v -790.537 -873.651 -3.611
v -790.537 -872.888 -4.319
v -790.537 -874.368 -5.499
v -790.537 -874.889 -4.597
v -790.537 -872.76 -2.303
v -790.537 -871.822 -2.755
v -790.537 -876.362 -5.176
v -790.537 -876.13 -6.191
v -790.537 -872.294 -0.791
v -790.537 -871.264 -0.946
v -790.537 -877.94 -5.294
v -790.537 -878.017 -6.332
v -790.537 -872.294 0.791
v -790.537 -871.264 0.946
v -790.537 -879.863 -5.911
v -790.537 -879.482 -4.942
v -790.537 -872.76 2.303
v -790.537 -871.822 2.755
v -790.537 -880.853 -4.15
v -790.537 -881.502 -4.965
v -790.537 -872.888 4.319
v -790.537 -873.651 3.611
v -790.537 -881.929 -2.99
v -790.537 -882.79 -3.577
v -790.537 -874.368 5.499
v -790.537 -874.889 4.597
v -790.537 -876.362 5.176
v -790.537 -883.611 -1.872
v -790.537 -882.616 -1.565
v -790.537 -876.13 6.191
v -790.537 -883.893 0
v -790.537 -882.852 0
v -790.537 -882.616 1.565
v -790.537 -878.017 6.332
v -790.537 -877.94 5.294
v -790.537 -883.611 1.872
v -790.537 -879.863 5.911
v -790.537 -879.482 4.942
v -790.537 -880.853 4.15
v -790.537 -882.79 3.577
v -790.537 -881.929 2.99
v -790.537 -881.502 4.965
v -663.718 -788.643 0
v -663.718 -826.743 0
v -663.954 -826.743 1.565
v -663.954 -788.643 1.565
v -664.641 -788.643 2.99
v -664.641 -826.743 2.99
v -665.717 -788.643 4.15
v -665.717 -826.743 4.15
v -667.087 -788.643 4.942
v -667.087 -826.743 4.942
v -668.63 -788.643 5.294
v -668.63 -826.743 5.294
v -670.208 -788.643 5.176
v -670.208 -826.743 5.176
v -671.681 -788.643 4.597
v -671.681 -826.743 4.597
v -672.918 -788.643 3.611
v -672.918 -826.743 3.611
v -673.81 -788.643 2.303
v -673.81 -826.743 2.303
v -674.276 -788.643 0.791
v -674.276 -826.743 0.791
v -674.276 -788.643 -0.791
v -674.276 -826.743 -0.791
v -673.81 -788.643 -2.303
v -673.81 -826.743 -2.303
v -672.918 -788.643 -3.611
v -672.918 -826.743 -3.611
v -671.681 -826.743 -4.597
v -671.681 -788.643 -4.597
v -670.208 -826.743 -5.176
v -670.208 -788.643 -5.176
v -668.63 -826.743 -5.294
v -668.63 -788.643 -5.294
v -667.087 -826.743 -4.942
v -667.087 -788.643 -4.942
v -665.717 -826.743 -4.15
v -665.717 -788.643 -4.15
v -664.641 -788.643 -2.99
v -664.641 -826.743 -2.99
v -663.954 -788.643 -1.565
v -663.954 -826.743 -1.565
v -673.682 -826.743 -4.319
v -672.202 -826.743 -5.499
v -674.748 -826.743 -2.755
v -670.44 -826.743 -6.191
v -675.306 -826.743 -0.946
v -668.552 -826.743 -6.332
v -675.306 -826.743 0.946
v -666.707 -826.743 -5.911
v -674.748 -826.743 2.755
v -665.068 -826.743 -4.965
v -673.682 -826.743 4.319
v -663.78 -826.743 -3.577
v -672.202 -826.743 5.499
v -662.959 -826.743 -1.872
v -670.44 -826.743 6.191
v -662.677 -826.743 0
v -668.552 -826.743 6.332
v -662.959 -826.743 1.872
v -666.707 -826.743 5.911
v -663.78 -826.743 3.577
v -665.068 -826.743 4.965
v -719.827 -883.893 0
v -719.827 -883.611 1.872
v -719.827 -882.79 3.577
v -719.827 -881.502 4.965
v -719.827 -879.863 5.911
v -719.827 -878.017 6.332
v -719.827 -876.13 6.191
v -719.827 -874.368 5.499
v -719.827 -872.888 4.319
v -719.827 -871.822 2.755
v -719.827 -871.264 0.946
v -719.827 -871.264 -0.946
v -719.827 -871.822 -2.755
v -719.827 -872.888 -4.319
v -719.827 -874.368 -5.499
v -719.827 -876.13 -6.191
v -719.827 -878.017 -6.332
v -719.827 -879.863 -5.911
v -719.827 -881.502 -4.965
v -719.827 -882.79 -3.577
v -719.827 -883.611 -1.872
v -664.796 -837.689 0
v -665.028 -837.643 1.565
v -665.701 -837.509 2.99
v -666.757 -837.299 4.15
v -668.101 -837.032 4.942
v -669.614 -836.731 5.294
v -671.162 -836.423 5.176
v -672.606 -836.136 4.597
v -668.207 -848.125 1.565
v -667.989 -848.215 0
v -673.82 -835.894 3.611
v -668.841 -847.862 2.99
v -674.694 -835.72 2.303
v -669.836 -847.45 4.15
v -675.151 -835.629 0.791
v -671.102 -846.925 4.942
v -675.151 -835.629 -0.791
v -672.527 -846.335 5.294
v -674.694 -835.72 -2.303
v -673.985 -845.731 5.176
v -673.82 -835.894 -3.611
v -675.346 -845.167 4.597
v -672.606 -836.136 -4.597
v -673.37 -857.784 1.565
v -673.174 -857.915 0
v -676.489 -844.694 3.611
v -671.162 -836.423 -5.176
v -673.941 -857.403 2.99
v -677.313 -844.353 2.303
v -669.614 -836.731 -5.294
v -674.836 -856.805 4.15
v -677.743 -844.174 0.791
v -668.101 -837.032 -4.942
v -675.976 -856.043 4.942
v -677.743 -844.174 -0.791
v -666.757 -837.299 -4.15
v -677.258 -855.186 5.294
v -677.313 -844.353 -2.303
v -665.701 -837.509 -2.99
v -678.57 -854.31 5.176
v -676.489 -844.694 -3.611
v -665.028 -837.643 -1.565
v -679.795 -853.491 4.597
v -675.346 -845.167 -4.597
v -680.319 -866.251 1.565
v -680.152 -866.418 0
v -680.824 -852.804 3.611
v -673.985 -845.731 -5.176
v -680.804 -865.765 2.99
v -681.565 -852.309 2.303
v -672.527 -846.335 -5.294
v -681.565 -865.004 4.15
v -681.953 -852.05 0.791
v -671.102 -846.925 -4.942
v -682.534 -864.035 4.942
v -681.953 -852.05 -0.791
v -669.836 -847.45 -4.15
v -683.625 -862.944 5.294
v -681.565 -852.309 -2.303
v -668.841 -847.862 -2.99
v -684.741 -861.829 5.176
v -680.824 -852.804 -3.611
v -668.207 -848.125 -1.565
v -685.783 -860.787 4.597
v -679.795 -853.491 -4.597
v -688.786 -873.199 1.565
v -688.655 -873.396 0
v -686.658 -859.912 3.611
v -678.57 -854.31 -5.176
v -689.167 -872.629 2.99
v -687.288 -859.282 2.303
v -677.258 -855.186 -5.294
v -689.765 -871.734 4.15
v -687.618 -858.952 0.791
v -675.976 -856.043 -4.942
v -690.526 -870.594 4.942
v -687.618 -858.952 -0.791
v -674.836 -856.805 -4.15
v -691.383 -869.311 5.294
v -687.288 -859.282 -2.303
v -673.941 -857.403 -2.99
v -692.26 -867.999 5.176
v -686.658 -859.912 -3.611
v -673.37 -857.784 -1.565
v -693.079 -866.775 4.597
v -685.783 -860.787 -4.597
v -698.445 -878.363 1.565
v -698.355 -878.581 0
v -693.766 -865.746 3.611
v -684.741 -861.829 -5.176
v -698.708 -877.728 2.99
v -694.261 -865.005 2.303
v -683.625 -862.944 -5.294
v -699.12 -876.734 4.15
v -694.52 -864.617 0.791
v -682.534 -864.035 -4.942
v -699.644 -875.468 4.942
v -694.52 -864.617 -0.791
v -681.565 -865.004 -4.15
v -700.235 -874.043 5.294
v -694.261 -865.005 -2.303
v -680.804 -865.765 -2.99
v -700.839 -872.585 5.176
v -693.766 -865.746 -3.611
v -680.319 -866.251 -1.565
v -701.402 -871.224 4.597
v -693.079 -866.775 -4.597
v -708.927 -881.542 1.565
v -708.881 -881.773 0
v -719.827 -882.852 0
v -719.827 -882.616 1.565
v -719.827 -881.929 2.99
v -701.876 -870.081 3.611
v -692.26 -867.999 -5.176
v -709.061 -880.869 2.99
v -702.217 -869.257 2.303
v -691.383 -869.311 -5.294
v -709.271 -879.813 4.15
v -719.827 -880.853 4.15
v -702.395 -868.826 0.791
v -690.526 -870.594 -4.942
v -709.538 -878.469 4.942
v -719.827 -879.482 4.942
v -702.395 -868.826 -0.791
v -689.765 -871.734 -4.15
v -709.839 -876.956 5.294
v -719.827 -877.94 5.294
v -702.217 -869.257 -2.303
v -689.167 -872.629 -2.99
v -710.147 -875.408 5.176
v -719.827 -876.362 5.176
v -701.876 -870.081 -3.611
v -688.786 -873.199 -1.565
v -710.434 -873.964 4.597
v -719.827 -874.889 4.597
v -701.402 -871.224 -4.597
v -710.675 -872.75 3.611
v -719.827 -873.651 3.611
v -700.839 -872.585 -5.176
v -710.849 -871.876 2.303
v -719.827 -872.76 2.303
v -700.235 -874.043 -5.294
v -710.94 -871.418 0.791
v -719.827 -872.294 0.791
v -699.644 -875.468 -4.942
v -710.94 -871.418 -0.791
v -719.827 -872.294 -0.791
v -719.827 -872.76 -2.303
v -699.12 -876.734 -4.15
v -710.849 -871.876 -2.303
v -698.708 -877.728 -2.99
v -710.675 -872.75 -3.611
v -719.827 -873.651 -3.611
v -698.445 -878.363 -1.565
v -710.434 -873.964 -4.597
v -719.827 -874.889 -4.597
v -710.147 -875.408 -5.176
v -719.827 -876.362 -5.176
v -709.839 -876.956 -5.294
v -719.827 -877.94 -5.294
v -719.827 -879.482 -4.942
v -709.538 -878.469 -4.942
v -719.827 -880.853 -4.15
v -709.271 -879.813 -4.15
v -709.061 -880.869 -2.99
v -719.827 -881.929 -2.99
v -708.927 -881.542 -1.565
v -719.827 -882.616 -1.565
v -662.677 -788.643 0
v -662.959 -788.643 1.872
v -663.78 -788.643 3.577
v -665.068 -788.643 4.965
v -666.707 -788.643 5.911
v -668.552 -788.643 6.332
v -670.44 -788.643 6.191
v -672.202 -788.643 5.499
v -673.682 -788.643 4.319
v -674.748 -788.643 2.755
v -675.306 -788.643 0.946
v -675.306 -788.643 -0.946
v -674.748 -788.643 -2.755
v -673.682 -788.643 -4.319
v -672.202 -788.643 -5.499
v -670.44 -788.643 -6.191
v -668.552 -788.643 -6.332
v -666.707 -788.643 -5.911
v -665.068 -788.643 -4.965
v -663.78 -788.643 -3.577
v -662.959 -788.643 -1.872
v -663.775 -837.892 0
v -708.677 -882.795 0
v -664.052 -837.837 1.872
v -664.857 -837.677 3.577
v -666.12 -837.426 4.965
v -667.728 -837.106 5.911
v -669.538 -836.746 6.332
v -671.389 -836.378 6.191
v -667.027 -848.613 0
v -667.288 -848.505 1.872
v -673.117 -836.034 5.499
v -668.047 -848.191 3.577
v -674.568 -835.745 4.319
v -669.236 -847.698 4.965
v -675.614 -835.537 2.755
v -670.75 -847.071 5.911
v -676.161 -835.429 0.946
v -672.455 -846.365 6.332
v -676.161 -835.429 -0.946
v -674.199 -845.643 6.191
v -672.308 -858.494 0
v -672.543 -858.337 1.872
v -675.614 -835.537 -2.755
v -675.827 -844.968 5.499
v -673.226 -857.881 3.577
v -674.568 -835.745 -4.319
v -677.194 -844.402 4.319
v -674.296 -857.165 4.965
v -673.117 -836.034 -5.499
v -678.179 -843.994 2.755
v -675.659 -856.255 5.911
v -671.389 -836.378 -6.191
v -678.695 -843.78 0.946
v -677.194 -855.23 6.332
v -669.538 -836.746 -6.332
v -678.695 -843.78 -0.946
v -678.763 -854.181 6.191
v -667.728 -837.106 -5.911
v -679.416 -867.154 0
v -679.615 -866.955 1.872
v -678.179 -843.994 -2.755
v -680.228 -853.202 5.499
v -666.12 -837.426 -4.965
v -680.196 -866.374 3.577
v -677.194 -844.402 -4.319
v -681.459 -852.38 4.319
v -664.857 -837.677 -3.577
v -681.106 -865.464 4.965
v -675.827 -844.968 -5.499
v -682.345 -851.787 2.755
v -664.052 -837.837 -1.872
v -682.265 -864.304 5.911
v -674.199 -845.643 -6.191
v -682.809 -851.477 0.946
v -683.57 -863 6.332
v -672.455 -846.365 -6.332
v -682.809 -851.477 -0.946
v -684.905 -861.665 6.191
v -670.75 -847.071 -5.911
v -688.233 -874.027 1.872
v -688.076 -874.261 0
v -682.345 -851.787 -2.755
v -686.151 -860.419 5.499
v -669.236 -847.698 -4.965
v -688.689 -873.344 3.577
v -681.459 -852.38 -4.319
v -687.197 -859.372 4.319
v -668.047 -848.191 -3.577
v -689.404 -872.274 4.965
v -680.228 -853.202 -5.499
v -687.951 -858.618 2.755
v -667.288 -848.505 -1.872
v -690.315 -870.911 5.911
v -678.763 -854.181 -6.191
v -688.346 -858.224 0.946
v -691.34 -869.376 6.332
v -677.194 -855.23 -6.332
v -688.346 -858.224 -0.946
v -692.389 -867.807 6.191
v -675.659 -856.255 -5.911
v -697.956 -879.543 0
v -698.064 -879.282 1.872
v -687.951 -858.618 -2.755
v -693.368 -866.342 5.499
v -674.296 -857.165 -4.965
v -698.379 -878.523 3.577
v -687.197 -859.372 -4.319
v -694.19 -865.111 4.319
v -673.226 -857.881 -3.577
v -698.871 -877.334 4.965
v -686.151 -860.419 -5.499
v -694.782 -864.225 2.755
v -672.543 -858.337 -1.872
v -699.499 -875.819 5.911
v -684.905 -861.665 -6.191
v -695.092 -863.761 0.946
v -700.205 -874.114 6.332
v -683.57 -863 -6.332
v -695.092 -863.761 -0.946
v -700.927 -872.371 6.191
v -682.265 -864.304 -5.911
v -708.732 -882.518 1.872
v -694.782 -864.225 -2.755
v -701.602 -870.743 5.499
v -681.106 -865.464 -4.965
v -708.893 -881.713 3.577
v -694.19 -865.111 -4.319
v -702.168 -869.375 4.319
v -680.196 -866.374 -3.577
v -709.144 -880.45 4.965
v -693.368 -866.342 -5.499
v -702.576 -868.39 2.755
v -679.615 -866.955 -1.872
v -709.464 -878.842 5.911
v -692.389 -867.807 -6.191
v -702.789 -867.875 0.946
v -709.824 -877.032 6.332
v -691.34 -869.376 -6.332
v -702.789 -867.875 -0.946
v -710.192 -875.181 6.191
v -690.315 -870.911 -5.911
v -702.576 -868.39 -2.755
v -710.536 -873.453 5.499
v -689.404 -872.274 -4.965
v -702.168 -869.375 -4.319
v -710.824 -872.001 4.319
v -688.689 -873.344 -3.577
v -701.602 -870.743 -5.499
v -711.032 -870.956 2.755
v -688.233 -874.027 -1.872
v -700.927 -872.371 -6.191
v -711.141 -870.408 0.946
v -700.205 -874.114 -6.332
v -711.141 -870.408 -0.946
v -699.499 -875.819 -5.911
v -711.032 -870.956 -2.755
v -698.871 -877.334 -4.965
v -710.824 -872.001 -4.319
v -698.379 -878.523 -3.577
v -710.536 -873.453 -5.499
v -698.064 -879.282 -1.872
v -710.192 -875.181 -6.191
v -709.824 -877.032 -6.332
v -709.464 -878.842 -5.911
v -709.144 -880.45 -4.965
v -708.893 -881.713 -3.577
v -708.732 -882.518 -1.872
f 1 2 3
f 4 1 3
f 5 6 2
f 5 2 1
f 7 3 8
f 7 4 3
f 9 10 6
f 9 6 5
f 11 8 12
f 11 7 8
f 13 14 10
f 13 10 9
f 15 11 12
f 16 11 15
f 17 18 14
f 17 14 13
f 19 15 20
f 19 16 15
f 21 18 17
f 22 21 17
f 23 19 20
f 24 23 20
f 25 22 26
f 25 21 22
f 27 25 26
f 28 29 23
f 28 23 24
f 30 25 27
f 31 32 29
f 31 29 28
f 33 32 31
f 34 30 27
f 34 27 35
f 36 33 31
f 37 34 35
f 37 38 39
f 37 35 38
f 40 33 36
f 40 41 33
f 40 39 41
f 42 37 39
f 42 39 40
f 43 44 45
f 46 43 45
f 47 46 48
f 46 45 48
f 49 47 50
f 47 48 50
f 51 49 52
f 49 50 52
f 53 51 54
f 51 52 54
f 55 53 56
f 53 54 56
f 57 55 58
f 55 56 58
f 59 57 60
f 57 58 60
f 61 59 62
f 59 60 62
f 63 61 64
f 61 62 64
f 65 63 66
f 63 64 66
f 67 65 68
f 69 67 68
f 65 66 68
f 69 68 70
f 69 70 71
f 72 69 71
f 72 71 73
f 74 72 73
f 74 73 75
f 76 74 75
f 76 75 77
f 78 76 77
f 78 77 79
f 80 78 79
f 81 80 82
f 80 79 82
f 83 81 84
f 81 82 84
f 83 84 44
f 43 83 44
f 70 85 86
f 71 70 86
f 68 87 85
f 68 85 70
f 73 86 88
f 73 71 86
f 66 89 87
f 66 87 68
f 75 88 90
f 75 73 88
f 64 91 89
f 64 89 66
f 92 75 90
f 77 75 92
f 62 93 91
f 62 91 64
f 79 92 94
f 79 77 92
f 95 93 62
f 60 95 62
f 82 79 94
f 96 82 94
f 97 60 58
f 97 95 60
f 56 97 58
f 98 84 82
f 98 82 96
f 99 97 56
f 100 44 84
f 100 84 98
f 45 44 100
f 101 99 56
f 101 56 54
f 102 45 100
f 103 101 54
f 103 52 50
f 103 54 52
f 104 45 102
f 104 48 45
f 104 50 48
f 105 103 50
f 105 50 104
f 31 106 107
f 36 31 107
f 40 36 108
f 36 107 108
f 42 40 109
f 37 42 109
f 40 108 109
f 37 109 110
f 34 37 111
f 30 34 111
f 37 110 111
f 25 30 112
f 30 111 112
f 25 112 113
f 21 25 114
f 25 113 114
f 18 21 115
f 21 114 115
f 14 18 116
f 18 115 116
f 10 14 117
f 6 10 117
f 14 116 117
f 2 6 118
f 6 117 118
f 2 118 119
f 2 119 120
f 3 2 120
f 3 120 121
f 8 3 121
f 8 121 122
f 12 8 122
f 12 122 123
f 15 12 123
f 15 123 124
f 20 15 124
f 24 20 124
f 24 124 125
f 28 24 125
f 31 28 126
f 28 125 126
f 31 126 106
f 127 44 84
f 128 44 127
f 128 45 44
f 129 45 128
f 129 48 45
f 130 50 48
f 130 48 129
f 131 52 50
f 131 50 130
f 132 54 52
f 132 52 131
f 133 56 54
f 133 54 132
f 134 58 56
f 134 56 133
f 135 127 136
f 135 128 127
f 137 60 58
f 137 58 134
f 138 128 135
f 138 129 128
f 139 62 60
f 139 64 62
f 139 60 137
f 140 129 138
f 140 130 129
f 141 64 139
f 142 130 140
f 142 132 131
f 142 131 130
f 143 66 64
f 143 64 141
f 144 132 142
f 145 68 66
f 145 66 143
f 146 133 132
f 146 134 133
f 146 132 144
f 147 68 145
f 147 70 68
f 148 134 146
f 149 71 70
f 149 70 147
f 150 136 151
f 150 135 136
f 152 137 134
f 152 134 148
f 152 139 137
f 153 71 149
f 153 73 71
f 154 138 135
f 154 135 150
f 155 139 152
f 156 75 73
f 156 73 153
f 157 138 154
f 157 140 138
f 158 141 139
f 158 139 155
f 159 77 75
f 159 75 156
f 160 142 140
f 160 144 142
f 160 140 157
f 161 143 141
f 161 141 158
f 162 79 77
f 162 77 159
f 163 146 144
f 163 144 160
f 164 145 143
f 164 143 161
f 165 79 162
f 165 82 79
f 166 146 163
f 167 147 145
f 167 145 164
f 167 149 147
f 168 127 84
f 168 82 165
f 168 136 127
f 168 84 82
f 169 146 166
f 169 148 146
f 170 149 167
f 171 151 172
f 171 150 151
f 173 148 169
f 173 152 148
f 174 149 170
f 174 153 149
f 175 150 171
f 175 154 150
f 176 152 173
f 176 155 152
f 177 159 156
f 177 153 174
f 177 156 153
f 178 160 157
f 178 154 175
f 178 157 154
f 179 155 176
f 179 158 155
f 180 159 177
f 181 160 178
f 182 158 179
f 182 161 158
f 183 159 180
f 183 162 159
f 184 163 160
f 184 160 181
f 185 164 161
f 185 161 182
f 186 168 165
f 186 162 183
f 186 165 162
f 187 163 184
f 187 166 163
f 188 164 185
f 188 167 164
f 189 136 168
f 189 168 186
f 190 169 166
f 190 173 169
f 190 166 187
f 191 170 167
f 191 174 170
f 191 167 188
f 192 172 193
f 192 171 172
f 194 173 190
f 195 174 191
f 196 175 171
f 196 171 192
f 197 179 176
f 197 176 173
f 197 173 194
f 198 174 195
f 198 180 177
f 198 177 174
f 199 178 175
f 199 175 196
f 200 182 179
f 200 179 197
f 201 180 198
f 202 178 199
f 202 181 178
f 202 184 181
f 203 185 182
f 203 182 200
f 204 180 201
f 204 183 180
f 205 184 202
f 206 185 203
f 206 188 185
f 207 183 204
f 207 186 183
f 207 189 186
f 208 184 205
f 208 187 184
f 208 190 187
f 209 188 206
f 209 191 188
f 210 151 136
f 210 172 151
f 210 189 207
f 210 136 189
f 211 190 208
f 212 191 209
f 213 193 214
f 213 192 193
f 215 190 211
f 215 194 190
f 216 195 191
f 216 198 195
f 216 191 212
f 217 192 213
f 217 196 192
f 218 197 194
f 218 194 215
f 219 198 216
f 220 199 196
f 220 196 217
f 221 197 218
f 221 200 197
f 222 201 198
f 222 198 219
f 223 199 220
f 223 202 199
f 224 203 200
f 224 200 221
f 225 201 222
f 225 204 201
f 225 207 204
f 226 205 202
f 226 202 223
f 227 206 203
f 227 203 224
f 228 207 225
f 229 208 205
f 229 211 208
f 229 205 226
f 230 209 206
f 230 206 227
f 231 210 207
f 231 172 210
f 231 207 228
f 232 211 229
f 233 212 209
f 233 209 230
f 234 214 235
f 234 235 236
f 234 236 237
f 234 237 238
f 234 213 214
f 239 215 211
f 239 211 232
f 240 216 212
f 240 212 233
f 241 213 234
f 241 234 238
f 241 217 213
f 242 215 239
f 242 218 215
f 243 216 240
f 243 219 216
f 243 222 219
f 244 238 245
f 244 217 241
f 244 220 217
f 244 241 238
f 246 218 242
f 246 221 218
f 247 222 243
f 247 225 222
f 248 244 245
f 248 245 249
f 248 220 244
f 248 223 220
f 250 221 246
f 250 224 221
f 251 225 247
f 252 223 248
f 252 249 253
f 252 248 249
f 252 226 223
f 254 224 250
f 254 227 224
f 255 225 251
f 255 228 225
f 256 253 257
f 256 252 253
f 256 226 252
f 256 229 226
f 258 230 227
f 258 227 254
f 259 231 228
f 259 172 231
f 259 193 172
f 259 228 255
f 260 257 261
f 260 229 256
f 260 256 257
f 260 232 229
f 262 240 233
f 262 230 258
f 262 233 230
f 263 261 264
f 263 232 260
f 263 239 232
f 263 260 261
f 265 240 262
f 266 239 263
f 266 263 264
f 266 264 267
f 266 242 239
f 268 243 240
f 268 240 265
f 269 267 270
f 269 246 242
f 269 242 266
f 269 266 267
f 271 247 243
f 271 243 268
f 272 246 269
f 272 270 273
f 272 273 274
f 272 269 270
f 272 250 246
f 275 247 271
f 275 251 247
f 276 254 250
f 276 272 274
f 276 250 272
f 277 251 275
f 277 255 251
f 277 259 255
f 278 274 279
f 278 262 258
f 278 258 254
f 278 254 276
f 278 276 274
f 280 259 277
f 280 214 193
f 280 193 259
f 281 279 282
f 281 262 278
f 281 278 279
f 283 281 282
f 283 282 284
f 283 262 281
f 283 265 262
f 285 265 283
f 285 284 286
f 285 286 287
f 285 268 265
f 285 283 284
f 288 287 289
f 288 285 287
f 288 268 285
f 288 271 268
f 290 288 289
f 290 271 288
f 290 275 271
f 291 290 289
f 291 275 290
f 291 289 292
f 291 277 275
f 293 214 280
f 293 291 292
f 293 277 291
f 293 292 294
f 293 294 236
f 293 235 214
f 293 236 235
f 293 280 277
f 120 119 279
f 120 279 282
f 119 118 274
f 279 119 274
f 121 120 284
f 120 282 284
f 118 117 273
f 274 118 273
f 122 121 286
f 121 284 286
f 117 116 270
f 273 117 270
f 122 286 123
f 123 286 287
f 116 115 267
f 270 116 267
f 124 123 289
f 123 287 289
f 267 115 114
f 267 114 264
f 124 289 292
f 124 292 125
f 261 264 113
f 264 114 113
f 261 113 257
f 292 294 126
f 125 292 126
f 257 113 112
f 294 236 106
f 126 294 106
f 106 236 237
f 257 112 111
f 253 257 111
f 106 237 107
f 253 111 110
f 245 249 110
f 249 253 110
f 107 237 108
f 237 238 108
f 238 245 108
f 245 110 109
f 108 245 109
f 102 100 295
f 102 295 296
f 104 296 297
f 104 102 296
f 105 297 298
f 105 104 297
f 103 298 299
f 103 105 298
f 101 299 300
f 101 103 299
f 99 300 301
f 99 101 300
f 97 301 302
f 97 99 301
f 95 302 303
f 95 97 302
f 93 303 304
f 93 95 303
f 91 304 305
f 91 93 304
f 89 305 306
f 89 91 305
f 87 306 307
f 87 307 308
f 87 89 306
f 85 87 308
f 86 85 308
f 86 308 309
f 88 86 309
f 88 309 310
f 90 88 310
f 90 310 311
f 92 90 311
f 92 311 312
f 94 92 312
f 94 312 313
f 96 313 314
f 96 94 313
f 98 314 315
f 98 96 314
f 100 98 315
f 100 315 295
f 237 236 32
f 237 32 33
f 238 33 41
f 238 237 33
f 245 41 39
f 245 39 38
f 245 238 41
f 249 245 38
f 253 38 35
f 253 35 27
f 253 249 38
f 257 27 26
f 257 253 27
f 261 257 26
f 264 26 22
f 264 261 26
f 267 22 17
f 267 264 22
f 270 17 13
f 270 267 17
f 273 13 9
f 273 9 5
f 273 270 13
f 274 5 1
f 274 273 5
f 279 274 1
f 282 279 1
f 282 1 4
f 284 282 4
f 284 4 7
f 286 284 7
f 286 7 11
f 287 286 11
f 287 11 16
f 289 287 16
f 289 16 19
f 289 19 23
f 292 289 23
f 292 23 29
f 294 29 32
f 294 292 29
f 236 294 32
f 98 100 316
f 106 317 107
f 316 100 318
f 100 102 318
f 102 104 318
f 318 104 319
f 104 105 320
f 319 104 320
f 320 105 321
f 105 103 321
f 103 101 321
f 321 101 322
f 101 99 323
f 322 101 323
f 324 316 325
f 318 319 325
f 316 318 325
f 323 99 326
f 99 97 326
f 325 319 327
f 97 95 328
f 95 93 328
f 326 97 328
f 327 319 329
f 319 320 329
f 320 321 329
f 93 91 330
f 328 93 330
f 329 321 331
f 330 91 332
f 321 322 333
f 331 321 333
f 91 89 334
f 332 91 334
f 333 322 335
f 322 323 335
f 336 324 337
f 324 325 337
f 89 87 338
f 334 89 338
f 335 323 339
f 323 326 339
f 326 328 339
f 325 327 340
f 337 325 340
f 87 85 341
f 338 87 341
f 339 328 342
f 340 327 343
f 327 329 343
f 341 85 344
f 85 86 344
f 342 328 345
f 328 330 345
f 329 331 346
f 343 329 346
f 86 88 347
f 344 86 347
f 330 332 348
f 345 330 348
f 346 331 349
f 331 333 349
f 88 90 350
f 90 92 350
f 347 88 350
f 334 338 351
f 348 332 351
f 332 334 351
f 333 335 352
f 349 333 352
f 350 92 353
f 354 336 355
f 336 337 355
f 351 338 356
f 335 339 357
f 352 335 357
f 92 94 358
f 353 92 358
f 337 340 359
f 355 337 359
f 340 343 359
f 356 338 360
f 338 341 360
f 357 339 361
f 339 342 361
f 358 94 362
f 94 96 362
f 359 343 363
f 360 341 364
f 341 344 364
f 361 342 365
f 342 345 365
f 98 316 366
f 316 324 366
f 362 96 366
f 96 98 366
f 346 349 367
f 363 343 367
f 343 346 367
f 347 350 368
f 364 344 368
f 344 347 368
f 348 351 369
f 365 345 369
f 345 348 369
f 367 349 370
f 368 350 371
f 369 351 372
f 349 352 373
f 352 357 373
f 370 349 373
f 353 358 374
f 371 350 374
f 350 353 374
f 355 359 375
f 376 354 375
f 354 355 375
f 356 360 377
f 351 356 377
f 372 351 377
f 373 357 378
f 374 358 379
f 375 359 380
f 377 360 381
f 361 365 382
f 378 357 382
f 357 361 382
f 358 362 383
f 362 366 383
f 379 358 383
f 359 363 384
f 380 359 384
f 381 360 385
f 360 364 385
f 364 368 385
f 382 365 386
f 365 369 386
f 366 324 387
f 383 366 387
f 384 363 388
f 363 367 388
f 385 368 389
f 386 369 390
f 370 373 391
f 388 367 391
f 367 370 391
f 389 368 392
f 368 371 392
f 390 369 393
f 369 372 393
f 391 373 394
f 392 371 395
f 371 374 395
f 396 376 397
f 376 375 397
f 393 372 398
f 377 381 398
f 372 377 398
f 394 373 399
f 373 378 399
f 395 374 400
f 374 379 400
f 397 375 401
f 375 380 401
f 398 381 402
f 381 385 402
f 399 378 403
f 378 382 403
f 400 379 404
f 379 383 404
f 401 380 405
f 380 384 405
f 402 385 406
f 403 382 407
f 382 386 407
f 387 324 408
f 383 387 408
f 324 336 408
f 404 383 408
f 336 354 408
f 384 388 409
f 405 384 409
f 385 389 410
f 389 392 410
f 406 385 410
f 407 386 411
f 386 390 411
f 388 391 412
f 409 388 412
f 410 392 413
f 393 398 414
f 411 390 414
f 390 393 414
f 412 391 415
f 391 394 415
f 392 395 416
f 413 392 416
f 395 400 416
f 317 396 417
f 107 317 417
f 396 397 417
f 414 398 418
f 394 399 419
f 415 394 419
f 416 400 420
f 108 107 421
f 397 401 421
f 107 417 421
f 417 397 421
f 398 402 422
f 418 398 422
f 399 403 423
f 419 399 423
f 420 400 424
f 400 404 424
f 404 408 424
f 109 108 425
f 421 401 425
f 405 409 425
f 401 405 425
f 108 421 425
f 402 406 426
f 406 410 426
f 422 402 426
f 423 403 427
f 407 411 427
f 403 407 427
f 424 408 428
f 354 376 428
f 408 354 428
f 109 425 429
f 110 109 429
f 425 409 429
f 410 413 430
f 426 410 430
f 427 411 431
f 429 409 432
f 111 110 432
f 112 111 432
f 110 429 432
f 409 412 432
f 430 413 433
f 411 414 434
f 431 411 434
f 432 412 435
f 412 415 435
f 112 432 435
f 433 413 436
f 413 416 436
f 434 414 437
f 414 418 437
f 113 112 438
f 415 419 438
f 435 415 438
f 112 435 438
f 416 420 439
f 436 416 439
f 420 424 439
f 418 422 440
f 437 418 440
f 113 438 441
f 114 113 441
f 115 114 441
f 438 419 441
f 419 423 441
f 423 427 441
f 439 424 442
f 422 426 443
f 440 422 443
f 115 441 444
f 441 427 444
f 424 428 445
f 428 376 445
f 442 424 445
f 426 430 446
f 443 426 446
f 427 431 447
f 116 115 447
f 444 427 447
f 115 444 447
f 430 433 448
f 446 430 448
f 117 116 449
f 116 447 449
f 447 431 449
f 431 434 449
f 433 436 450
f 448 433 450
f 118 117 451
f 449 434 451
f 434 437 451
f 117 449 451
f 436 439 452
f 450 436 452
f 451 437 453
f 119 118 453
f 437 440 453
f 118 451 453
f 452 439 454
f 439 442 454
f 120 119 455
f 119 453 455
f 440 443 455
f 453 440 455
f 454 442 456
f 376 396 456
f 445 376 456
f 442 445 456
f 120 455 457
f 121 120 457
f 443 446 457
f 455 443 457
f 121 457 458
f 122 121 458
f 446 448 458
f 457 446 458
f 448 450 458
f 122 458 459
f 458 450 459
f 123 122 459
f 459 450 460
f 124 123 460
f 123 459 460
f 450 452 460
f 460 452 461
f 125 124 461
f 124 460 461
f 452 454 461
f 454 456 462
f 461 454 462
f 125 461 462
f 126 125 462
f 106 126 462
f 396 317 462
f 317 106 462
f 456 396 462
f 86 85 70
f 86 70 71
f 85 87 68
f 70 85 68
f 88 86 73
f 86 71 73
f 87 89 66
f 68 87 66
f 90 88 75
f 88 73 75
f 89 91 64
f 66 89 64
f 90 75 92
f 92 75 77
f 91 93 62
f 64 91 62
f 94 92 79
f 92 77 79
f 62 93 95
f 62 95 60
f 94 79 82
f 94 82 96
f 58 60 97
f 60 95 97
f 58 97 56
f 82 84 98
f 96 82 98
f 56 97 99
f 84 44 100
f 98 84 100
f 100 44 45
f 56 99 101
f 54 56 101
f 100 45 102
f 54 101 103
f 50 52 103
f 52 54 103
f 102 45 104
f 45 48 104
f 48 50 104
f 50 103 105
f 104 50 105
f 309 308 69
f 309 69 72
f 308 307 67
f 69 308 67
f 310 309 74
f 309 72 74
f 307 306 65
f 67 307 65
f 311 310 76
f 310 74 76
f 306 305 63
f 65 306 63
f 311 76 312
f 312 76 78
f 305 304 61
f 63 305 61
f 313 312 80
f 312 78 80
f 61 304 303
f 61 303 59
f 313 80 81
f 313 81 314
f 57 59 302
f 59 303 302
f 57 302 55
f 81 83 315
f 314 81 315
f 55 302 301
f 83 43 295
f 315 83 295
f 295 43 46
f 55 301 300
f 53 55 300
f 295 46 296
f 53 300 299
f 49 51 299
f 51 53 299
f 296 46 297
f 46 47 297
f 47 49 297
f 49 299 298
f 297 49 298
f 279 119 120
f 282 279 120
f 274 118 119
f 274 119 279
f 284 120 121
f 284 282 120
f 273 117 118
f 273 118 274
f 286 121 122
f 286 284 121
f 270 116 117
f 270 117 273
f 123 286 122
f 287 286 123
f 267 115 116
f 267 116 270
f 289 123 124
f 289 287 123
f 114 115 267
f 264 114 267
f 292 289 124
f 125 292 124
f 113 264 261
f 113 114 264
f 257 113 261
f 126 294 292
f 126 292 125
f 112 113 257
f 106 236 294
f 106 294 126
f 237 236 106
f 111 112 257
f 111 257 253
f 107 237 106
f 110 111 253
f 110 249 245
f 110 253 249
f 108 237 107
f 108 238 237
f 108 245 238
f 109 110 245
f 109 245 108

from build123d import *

# Parameters (mm, degrees)
SKETCH1_R                 = 6.35
SKETCH1_R_2               = 5.3086
PIPE_0_5_SCH_40_1_DEPTH   = 38.1
SKETCH1_ON_SEGMENT_2_R    = 6.35
SKETCH1_ON_SEGMENT_2_R_2  = 5.3086
PIPE_0_5_SCH_40_1_2_ANGLE = 90
SKETCH1_ON_SEGMENT_3_R    = 6.35
SKETCH1_ON_SEGMENT_3_R_2  = 5.3086
PIPE_0_5_SCH_40_1_3_DEPTH = 70.710462117


with BuildPart() as part:
    # Sketch1 → Pipe 0.5 SCH 40(1) (new body)
    with BuildSketch(Plane(origin=(-669.026852299, -826.74293683, 0), x_dir=(1, 0, 0), z_dir=(0, -1, 0))):
        Circle(SKETCH1_R)
        Circle(SKETCH1_R_2, mode=Mode.SUBTRACT)
    extrude(amount=-PIPE_0_5_SCH_40_1_DEPTH)


with BuildPart() as body_2:
    # Sketch1 on segment 2 (carried to the start of arc 2) → Pipe 0.5 SCH 40_1 2 (revolve)
    with BuildSketch(Plane(origin=(-669.026852299, -826.74293683, 0), x_dir=(1, 0, 0), z_dir=(0, -1, 0))):
        Circle(SKETCH1_ON_SEGMENT_2_R)
        Circle(SKETCH1_ON_SEGMENT_2_R_2, mode=Mode.SUBTRACT)
    revolve(axis=Axis((-719.826852299, -826.74293683, 0), (0, 0, -1)), revolution_arc=PIPE_0_5_SCH_40_1_2_ANGLE)


with BuildPart() as body_3:
    # Sketch1 on segment 3 (carried to segment 3) → Pipe 0.5 SCH 40_1 3 (new body)
    with BuildSketch(Plane(origin=(-719.826852299, -877.54293683, 0), x_dir=(0, -1, 0), z_dir=(-1, 0, 0))):
        Circle(SKETCH1_ON_SEGMENT_3_R)
        Circle(SKETCH1_ON_SEGMENT_3_R_2, mode=Mode.SUBTRACT)
    extrude(amount=PIPE_0_5_SCH_40_1_3_DEPTH)


solid = Compound([part.part, body_2.part, body_3.part])
